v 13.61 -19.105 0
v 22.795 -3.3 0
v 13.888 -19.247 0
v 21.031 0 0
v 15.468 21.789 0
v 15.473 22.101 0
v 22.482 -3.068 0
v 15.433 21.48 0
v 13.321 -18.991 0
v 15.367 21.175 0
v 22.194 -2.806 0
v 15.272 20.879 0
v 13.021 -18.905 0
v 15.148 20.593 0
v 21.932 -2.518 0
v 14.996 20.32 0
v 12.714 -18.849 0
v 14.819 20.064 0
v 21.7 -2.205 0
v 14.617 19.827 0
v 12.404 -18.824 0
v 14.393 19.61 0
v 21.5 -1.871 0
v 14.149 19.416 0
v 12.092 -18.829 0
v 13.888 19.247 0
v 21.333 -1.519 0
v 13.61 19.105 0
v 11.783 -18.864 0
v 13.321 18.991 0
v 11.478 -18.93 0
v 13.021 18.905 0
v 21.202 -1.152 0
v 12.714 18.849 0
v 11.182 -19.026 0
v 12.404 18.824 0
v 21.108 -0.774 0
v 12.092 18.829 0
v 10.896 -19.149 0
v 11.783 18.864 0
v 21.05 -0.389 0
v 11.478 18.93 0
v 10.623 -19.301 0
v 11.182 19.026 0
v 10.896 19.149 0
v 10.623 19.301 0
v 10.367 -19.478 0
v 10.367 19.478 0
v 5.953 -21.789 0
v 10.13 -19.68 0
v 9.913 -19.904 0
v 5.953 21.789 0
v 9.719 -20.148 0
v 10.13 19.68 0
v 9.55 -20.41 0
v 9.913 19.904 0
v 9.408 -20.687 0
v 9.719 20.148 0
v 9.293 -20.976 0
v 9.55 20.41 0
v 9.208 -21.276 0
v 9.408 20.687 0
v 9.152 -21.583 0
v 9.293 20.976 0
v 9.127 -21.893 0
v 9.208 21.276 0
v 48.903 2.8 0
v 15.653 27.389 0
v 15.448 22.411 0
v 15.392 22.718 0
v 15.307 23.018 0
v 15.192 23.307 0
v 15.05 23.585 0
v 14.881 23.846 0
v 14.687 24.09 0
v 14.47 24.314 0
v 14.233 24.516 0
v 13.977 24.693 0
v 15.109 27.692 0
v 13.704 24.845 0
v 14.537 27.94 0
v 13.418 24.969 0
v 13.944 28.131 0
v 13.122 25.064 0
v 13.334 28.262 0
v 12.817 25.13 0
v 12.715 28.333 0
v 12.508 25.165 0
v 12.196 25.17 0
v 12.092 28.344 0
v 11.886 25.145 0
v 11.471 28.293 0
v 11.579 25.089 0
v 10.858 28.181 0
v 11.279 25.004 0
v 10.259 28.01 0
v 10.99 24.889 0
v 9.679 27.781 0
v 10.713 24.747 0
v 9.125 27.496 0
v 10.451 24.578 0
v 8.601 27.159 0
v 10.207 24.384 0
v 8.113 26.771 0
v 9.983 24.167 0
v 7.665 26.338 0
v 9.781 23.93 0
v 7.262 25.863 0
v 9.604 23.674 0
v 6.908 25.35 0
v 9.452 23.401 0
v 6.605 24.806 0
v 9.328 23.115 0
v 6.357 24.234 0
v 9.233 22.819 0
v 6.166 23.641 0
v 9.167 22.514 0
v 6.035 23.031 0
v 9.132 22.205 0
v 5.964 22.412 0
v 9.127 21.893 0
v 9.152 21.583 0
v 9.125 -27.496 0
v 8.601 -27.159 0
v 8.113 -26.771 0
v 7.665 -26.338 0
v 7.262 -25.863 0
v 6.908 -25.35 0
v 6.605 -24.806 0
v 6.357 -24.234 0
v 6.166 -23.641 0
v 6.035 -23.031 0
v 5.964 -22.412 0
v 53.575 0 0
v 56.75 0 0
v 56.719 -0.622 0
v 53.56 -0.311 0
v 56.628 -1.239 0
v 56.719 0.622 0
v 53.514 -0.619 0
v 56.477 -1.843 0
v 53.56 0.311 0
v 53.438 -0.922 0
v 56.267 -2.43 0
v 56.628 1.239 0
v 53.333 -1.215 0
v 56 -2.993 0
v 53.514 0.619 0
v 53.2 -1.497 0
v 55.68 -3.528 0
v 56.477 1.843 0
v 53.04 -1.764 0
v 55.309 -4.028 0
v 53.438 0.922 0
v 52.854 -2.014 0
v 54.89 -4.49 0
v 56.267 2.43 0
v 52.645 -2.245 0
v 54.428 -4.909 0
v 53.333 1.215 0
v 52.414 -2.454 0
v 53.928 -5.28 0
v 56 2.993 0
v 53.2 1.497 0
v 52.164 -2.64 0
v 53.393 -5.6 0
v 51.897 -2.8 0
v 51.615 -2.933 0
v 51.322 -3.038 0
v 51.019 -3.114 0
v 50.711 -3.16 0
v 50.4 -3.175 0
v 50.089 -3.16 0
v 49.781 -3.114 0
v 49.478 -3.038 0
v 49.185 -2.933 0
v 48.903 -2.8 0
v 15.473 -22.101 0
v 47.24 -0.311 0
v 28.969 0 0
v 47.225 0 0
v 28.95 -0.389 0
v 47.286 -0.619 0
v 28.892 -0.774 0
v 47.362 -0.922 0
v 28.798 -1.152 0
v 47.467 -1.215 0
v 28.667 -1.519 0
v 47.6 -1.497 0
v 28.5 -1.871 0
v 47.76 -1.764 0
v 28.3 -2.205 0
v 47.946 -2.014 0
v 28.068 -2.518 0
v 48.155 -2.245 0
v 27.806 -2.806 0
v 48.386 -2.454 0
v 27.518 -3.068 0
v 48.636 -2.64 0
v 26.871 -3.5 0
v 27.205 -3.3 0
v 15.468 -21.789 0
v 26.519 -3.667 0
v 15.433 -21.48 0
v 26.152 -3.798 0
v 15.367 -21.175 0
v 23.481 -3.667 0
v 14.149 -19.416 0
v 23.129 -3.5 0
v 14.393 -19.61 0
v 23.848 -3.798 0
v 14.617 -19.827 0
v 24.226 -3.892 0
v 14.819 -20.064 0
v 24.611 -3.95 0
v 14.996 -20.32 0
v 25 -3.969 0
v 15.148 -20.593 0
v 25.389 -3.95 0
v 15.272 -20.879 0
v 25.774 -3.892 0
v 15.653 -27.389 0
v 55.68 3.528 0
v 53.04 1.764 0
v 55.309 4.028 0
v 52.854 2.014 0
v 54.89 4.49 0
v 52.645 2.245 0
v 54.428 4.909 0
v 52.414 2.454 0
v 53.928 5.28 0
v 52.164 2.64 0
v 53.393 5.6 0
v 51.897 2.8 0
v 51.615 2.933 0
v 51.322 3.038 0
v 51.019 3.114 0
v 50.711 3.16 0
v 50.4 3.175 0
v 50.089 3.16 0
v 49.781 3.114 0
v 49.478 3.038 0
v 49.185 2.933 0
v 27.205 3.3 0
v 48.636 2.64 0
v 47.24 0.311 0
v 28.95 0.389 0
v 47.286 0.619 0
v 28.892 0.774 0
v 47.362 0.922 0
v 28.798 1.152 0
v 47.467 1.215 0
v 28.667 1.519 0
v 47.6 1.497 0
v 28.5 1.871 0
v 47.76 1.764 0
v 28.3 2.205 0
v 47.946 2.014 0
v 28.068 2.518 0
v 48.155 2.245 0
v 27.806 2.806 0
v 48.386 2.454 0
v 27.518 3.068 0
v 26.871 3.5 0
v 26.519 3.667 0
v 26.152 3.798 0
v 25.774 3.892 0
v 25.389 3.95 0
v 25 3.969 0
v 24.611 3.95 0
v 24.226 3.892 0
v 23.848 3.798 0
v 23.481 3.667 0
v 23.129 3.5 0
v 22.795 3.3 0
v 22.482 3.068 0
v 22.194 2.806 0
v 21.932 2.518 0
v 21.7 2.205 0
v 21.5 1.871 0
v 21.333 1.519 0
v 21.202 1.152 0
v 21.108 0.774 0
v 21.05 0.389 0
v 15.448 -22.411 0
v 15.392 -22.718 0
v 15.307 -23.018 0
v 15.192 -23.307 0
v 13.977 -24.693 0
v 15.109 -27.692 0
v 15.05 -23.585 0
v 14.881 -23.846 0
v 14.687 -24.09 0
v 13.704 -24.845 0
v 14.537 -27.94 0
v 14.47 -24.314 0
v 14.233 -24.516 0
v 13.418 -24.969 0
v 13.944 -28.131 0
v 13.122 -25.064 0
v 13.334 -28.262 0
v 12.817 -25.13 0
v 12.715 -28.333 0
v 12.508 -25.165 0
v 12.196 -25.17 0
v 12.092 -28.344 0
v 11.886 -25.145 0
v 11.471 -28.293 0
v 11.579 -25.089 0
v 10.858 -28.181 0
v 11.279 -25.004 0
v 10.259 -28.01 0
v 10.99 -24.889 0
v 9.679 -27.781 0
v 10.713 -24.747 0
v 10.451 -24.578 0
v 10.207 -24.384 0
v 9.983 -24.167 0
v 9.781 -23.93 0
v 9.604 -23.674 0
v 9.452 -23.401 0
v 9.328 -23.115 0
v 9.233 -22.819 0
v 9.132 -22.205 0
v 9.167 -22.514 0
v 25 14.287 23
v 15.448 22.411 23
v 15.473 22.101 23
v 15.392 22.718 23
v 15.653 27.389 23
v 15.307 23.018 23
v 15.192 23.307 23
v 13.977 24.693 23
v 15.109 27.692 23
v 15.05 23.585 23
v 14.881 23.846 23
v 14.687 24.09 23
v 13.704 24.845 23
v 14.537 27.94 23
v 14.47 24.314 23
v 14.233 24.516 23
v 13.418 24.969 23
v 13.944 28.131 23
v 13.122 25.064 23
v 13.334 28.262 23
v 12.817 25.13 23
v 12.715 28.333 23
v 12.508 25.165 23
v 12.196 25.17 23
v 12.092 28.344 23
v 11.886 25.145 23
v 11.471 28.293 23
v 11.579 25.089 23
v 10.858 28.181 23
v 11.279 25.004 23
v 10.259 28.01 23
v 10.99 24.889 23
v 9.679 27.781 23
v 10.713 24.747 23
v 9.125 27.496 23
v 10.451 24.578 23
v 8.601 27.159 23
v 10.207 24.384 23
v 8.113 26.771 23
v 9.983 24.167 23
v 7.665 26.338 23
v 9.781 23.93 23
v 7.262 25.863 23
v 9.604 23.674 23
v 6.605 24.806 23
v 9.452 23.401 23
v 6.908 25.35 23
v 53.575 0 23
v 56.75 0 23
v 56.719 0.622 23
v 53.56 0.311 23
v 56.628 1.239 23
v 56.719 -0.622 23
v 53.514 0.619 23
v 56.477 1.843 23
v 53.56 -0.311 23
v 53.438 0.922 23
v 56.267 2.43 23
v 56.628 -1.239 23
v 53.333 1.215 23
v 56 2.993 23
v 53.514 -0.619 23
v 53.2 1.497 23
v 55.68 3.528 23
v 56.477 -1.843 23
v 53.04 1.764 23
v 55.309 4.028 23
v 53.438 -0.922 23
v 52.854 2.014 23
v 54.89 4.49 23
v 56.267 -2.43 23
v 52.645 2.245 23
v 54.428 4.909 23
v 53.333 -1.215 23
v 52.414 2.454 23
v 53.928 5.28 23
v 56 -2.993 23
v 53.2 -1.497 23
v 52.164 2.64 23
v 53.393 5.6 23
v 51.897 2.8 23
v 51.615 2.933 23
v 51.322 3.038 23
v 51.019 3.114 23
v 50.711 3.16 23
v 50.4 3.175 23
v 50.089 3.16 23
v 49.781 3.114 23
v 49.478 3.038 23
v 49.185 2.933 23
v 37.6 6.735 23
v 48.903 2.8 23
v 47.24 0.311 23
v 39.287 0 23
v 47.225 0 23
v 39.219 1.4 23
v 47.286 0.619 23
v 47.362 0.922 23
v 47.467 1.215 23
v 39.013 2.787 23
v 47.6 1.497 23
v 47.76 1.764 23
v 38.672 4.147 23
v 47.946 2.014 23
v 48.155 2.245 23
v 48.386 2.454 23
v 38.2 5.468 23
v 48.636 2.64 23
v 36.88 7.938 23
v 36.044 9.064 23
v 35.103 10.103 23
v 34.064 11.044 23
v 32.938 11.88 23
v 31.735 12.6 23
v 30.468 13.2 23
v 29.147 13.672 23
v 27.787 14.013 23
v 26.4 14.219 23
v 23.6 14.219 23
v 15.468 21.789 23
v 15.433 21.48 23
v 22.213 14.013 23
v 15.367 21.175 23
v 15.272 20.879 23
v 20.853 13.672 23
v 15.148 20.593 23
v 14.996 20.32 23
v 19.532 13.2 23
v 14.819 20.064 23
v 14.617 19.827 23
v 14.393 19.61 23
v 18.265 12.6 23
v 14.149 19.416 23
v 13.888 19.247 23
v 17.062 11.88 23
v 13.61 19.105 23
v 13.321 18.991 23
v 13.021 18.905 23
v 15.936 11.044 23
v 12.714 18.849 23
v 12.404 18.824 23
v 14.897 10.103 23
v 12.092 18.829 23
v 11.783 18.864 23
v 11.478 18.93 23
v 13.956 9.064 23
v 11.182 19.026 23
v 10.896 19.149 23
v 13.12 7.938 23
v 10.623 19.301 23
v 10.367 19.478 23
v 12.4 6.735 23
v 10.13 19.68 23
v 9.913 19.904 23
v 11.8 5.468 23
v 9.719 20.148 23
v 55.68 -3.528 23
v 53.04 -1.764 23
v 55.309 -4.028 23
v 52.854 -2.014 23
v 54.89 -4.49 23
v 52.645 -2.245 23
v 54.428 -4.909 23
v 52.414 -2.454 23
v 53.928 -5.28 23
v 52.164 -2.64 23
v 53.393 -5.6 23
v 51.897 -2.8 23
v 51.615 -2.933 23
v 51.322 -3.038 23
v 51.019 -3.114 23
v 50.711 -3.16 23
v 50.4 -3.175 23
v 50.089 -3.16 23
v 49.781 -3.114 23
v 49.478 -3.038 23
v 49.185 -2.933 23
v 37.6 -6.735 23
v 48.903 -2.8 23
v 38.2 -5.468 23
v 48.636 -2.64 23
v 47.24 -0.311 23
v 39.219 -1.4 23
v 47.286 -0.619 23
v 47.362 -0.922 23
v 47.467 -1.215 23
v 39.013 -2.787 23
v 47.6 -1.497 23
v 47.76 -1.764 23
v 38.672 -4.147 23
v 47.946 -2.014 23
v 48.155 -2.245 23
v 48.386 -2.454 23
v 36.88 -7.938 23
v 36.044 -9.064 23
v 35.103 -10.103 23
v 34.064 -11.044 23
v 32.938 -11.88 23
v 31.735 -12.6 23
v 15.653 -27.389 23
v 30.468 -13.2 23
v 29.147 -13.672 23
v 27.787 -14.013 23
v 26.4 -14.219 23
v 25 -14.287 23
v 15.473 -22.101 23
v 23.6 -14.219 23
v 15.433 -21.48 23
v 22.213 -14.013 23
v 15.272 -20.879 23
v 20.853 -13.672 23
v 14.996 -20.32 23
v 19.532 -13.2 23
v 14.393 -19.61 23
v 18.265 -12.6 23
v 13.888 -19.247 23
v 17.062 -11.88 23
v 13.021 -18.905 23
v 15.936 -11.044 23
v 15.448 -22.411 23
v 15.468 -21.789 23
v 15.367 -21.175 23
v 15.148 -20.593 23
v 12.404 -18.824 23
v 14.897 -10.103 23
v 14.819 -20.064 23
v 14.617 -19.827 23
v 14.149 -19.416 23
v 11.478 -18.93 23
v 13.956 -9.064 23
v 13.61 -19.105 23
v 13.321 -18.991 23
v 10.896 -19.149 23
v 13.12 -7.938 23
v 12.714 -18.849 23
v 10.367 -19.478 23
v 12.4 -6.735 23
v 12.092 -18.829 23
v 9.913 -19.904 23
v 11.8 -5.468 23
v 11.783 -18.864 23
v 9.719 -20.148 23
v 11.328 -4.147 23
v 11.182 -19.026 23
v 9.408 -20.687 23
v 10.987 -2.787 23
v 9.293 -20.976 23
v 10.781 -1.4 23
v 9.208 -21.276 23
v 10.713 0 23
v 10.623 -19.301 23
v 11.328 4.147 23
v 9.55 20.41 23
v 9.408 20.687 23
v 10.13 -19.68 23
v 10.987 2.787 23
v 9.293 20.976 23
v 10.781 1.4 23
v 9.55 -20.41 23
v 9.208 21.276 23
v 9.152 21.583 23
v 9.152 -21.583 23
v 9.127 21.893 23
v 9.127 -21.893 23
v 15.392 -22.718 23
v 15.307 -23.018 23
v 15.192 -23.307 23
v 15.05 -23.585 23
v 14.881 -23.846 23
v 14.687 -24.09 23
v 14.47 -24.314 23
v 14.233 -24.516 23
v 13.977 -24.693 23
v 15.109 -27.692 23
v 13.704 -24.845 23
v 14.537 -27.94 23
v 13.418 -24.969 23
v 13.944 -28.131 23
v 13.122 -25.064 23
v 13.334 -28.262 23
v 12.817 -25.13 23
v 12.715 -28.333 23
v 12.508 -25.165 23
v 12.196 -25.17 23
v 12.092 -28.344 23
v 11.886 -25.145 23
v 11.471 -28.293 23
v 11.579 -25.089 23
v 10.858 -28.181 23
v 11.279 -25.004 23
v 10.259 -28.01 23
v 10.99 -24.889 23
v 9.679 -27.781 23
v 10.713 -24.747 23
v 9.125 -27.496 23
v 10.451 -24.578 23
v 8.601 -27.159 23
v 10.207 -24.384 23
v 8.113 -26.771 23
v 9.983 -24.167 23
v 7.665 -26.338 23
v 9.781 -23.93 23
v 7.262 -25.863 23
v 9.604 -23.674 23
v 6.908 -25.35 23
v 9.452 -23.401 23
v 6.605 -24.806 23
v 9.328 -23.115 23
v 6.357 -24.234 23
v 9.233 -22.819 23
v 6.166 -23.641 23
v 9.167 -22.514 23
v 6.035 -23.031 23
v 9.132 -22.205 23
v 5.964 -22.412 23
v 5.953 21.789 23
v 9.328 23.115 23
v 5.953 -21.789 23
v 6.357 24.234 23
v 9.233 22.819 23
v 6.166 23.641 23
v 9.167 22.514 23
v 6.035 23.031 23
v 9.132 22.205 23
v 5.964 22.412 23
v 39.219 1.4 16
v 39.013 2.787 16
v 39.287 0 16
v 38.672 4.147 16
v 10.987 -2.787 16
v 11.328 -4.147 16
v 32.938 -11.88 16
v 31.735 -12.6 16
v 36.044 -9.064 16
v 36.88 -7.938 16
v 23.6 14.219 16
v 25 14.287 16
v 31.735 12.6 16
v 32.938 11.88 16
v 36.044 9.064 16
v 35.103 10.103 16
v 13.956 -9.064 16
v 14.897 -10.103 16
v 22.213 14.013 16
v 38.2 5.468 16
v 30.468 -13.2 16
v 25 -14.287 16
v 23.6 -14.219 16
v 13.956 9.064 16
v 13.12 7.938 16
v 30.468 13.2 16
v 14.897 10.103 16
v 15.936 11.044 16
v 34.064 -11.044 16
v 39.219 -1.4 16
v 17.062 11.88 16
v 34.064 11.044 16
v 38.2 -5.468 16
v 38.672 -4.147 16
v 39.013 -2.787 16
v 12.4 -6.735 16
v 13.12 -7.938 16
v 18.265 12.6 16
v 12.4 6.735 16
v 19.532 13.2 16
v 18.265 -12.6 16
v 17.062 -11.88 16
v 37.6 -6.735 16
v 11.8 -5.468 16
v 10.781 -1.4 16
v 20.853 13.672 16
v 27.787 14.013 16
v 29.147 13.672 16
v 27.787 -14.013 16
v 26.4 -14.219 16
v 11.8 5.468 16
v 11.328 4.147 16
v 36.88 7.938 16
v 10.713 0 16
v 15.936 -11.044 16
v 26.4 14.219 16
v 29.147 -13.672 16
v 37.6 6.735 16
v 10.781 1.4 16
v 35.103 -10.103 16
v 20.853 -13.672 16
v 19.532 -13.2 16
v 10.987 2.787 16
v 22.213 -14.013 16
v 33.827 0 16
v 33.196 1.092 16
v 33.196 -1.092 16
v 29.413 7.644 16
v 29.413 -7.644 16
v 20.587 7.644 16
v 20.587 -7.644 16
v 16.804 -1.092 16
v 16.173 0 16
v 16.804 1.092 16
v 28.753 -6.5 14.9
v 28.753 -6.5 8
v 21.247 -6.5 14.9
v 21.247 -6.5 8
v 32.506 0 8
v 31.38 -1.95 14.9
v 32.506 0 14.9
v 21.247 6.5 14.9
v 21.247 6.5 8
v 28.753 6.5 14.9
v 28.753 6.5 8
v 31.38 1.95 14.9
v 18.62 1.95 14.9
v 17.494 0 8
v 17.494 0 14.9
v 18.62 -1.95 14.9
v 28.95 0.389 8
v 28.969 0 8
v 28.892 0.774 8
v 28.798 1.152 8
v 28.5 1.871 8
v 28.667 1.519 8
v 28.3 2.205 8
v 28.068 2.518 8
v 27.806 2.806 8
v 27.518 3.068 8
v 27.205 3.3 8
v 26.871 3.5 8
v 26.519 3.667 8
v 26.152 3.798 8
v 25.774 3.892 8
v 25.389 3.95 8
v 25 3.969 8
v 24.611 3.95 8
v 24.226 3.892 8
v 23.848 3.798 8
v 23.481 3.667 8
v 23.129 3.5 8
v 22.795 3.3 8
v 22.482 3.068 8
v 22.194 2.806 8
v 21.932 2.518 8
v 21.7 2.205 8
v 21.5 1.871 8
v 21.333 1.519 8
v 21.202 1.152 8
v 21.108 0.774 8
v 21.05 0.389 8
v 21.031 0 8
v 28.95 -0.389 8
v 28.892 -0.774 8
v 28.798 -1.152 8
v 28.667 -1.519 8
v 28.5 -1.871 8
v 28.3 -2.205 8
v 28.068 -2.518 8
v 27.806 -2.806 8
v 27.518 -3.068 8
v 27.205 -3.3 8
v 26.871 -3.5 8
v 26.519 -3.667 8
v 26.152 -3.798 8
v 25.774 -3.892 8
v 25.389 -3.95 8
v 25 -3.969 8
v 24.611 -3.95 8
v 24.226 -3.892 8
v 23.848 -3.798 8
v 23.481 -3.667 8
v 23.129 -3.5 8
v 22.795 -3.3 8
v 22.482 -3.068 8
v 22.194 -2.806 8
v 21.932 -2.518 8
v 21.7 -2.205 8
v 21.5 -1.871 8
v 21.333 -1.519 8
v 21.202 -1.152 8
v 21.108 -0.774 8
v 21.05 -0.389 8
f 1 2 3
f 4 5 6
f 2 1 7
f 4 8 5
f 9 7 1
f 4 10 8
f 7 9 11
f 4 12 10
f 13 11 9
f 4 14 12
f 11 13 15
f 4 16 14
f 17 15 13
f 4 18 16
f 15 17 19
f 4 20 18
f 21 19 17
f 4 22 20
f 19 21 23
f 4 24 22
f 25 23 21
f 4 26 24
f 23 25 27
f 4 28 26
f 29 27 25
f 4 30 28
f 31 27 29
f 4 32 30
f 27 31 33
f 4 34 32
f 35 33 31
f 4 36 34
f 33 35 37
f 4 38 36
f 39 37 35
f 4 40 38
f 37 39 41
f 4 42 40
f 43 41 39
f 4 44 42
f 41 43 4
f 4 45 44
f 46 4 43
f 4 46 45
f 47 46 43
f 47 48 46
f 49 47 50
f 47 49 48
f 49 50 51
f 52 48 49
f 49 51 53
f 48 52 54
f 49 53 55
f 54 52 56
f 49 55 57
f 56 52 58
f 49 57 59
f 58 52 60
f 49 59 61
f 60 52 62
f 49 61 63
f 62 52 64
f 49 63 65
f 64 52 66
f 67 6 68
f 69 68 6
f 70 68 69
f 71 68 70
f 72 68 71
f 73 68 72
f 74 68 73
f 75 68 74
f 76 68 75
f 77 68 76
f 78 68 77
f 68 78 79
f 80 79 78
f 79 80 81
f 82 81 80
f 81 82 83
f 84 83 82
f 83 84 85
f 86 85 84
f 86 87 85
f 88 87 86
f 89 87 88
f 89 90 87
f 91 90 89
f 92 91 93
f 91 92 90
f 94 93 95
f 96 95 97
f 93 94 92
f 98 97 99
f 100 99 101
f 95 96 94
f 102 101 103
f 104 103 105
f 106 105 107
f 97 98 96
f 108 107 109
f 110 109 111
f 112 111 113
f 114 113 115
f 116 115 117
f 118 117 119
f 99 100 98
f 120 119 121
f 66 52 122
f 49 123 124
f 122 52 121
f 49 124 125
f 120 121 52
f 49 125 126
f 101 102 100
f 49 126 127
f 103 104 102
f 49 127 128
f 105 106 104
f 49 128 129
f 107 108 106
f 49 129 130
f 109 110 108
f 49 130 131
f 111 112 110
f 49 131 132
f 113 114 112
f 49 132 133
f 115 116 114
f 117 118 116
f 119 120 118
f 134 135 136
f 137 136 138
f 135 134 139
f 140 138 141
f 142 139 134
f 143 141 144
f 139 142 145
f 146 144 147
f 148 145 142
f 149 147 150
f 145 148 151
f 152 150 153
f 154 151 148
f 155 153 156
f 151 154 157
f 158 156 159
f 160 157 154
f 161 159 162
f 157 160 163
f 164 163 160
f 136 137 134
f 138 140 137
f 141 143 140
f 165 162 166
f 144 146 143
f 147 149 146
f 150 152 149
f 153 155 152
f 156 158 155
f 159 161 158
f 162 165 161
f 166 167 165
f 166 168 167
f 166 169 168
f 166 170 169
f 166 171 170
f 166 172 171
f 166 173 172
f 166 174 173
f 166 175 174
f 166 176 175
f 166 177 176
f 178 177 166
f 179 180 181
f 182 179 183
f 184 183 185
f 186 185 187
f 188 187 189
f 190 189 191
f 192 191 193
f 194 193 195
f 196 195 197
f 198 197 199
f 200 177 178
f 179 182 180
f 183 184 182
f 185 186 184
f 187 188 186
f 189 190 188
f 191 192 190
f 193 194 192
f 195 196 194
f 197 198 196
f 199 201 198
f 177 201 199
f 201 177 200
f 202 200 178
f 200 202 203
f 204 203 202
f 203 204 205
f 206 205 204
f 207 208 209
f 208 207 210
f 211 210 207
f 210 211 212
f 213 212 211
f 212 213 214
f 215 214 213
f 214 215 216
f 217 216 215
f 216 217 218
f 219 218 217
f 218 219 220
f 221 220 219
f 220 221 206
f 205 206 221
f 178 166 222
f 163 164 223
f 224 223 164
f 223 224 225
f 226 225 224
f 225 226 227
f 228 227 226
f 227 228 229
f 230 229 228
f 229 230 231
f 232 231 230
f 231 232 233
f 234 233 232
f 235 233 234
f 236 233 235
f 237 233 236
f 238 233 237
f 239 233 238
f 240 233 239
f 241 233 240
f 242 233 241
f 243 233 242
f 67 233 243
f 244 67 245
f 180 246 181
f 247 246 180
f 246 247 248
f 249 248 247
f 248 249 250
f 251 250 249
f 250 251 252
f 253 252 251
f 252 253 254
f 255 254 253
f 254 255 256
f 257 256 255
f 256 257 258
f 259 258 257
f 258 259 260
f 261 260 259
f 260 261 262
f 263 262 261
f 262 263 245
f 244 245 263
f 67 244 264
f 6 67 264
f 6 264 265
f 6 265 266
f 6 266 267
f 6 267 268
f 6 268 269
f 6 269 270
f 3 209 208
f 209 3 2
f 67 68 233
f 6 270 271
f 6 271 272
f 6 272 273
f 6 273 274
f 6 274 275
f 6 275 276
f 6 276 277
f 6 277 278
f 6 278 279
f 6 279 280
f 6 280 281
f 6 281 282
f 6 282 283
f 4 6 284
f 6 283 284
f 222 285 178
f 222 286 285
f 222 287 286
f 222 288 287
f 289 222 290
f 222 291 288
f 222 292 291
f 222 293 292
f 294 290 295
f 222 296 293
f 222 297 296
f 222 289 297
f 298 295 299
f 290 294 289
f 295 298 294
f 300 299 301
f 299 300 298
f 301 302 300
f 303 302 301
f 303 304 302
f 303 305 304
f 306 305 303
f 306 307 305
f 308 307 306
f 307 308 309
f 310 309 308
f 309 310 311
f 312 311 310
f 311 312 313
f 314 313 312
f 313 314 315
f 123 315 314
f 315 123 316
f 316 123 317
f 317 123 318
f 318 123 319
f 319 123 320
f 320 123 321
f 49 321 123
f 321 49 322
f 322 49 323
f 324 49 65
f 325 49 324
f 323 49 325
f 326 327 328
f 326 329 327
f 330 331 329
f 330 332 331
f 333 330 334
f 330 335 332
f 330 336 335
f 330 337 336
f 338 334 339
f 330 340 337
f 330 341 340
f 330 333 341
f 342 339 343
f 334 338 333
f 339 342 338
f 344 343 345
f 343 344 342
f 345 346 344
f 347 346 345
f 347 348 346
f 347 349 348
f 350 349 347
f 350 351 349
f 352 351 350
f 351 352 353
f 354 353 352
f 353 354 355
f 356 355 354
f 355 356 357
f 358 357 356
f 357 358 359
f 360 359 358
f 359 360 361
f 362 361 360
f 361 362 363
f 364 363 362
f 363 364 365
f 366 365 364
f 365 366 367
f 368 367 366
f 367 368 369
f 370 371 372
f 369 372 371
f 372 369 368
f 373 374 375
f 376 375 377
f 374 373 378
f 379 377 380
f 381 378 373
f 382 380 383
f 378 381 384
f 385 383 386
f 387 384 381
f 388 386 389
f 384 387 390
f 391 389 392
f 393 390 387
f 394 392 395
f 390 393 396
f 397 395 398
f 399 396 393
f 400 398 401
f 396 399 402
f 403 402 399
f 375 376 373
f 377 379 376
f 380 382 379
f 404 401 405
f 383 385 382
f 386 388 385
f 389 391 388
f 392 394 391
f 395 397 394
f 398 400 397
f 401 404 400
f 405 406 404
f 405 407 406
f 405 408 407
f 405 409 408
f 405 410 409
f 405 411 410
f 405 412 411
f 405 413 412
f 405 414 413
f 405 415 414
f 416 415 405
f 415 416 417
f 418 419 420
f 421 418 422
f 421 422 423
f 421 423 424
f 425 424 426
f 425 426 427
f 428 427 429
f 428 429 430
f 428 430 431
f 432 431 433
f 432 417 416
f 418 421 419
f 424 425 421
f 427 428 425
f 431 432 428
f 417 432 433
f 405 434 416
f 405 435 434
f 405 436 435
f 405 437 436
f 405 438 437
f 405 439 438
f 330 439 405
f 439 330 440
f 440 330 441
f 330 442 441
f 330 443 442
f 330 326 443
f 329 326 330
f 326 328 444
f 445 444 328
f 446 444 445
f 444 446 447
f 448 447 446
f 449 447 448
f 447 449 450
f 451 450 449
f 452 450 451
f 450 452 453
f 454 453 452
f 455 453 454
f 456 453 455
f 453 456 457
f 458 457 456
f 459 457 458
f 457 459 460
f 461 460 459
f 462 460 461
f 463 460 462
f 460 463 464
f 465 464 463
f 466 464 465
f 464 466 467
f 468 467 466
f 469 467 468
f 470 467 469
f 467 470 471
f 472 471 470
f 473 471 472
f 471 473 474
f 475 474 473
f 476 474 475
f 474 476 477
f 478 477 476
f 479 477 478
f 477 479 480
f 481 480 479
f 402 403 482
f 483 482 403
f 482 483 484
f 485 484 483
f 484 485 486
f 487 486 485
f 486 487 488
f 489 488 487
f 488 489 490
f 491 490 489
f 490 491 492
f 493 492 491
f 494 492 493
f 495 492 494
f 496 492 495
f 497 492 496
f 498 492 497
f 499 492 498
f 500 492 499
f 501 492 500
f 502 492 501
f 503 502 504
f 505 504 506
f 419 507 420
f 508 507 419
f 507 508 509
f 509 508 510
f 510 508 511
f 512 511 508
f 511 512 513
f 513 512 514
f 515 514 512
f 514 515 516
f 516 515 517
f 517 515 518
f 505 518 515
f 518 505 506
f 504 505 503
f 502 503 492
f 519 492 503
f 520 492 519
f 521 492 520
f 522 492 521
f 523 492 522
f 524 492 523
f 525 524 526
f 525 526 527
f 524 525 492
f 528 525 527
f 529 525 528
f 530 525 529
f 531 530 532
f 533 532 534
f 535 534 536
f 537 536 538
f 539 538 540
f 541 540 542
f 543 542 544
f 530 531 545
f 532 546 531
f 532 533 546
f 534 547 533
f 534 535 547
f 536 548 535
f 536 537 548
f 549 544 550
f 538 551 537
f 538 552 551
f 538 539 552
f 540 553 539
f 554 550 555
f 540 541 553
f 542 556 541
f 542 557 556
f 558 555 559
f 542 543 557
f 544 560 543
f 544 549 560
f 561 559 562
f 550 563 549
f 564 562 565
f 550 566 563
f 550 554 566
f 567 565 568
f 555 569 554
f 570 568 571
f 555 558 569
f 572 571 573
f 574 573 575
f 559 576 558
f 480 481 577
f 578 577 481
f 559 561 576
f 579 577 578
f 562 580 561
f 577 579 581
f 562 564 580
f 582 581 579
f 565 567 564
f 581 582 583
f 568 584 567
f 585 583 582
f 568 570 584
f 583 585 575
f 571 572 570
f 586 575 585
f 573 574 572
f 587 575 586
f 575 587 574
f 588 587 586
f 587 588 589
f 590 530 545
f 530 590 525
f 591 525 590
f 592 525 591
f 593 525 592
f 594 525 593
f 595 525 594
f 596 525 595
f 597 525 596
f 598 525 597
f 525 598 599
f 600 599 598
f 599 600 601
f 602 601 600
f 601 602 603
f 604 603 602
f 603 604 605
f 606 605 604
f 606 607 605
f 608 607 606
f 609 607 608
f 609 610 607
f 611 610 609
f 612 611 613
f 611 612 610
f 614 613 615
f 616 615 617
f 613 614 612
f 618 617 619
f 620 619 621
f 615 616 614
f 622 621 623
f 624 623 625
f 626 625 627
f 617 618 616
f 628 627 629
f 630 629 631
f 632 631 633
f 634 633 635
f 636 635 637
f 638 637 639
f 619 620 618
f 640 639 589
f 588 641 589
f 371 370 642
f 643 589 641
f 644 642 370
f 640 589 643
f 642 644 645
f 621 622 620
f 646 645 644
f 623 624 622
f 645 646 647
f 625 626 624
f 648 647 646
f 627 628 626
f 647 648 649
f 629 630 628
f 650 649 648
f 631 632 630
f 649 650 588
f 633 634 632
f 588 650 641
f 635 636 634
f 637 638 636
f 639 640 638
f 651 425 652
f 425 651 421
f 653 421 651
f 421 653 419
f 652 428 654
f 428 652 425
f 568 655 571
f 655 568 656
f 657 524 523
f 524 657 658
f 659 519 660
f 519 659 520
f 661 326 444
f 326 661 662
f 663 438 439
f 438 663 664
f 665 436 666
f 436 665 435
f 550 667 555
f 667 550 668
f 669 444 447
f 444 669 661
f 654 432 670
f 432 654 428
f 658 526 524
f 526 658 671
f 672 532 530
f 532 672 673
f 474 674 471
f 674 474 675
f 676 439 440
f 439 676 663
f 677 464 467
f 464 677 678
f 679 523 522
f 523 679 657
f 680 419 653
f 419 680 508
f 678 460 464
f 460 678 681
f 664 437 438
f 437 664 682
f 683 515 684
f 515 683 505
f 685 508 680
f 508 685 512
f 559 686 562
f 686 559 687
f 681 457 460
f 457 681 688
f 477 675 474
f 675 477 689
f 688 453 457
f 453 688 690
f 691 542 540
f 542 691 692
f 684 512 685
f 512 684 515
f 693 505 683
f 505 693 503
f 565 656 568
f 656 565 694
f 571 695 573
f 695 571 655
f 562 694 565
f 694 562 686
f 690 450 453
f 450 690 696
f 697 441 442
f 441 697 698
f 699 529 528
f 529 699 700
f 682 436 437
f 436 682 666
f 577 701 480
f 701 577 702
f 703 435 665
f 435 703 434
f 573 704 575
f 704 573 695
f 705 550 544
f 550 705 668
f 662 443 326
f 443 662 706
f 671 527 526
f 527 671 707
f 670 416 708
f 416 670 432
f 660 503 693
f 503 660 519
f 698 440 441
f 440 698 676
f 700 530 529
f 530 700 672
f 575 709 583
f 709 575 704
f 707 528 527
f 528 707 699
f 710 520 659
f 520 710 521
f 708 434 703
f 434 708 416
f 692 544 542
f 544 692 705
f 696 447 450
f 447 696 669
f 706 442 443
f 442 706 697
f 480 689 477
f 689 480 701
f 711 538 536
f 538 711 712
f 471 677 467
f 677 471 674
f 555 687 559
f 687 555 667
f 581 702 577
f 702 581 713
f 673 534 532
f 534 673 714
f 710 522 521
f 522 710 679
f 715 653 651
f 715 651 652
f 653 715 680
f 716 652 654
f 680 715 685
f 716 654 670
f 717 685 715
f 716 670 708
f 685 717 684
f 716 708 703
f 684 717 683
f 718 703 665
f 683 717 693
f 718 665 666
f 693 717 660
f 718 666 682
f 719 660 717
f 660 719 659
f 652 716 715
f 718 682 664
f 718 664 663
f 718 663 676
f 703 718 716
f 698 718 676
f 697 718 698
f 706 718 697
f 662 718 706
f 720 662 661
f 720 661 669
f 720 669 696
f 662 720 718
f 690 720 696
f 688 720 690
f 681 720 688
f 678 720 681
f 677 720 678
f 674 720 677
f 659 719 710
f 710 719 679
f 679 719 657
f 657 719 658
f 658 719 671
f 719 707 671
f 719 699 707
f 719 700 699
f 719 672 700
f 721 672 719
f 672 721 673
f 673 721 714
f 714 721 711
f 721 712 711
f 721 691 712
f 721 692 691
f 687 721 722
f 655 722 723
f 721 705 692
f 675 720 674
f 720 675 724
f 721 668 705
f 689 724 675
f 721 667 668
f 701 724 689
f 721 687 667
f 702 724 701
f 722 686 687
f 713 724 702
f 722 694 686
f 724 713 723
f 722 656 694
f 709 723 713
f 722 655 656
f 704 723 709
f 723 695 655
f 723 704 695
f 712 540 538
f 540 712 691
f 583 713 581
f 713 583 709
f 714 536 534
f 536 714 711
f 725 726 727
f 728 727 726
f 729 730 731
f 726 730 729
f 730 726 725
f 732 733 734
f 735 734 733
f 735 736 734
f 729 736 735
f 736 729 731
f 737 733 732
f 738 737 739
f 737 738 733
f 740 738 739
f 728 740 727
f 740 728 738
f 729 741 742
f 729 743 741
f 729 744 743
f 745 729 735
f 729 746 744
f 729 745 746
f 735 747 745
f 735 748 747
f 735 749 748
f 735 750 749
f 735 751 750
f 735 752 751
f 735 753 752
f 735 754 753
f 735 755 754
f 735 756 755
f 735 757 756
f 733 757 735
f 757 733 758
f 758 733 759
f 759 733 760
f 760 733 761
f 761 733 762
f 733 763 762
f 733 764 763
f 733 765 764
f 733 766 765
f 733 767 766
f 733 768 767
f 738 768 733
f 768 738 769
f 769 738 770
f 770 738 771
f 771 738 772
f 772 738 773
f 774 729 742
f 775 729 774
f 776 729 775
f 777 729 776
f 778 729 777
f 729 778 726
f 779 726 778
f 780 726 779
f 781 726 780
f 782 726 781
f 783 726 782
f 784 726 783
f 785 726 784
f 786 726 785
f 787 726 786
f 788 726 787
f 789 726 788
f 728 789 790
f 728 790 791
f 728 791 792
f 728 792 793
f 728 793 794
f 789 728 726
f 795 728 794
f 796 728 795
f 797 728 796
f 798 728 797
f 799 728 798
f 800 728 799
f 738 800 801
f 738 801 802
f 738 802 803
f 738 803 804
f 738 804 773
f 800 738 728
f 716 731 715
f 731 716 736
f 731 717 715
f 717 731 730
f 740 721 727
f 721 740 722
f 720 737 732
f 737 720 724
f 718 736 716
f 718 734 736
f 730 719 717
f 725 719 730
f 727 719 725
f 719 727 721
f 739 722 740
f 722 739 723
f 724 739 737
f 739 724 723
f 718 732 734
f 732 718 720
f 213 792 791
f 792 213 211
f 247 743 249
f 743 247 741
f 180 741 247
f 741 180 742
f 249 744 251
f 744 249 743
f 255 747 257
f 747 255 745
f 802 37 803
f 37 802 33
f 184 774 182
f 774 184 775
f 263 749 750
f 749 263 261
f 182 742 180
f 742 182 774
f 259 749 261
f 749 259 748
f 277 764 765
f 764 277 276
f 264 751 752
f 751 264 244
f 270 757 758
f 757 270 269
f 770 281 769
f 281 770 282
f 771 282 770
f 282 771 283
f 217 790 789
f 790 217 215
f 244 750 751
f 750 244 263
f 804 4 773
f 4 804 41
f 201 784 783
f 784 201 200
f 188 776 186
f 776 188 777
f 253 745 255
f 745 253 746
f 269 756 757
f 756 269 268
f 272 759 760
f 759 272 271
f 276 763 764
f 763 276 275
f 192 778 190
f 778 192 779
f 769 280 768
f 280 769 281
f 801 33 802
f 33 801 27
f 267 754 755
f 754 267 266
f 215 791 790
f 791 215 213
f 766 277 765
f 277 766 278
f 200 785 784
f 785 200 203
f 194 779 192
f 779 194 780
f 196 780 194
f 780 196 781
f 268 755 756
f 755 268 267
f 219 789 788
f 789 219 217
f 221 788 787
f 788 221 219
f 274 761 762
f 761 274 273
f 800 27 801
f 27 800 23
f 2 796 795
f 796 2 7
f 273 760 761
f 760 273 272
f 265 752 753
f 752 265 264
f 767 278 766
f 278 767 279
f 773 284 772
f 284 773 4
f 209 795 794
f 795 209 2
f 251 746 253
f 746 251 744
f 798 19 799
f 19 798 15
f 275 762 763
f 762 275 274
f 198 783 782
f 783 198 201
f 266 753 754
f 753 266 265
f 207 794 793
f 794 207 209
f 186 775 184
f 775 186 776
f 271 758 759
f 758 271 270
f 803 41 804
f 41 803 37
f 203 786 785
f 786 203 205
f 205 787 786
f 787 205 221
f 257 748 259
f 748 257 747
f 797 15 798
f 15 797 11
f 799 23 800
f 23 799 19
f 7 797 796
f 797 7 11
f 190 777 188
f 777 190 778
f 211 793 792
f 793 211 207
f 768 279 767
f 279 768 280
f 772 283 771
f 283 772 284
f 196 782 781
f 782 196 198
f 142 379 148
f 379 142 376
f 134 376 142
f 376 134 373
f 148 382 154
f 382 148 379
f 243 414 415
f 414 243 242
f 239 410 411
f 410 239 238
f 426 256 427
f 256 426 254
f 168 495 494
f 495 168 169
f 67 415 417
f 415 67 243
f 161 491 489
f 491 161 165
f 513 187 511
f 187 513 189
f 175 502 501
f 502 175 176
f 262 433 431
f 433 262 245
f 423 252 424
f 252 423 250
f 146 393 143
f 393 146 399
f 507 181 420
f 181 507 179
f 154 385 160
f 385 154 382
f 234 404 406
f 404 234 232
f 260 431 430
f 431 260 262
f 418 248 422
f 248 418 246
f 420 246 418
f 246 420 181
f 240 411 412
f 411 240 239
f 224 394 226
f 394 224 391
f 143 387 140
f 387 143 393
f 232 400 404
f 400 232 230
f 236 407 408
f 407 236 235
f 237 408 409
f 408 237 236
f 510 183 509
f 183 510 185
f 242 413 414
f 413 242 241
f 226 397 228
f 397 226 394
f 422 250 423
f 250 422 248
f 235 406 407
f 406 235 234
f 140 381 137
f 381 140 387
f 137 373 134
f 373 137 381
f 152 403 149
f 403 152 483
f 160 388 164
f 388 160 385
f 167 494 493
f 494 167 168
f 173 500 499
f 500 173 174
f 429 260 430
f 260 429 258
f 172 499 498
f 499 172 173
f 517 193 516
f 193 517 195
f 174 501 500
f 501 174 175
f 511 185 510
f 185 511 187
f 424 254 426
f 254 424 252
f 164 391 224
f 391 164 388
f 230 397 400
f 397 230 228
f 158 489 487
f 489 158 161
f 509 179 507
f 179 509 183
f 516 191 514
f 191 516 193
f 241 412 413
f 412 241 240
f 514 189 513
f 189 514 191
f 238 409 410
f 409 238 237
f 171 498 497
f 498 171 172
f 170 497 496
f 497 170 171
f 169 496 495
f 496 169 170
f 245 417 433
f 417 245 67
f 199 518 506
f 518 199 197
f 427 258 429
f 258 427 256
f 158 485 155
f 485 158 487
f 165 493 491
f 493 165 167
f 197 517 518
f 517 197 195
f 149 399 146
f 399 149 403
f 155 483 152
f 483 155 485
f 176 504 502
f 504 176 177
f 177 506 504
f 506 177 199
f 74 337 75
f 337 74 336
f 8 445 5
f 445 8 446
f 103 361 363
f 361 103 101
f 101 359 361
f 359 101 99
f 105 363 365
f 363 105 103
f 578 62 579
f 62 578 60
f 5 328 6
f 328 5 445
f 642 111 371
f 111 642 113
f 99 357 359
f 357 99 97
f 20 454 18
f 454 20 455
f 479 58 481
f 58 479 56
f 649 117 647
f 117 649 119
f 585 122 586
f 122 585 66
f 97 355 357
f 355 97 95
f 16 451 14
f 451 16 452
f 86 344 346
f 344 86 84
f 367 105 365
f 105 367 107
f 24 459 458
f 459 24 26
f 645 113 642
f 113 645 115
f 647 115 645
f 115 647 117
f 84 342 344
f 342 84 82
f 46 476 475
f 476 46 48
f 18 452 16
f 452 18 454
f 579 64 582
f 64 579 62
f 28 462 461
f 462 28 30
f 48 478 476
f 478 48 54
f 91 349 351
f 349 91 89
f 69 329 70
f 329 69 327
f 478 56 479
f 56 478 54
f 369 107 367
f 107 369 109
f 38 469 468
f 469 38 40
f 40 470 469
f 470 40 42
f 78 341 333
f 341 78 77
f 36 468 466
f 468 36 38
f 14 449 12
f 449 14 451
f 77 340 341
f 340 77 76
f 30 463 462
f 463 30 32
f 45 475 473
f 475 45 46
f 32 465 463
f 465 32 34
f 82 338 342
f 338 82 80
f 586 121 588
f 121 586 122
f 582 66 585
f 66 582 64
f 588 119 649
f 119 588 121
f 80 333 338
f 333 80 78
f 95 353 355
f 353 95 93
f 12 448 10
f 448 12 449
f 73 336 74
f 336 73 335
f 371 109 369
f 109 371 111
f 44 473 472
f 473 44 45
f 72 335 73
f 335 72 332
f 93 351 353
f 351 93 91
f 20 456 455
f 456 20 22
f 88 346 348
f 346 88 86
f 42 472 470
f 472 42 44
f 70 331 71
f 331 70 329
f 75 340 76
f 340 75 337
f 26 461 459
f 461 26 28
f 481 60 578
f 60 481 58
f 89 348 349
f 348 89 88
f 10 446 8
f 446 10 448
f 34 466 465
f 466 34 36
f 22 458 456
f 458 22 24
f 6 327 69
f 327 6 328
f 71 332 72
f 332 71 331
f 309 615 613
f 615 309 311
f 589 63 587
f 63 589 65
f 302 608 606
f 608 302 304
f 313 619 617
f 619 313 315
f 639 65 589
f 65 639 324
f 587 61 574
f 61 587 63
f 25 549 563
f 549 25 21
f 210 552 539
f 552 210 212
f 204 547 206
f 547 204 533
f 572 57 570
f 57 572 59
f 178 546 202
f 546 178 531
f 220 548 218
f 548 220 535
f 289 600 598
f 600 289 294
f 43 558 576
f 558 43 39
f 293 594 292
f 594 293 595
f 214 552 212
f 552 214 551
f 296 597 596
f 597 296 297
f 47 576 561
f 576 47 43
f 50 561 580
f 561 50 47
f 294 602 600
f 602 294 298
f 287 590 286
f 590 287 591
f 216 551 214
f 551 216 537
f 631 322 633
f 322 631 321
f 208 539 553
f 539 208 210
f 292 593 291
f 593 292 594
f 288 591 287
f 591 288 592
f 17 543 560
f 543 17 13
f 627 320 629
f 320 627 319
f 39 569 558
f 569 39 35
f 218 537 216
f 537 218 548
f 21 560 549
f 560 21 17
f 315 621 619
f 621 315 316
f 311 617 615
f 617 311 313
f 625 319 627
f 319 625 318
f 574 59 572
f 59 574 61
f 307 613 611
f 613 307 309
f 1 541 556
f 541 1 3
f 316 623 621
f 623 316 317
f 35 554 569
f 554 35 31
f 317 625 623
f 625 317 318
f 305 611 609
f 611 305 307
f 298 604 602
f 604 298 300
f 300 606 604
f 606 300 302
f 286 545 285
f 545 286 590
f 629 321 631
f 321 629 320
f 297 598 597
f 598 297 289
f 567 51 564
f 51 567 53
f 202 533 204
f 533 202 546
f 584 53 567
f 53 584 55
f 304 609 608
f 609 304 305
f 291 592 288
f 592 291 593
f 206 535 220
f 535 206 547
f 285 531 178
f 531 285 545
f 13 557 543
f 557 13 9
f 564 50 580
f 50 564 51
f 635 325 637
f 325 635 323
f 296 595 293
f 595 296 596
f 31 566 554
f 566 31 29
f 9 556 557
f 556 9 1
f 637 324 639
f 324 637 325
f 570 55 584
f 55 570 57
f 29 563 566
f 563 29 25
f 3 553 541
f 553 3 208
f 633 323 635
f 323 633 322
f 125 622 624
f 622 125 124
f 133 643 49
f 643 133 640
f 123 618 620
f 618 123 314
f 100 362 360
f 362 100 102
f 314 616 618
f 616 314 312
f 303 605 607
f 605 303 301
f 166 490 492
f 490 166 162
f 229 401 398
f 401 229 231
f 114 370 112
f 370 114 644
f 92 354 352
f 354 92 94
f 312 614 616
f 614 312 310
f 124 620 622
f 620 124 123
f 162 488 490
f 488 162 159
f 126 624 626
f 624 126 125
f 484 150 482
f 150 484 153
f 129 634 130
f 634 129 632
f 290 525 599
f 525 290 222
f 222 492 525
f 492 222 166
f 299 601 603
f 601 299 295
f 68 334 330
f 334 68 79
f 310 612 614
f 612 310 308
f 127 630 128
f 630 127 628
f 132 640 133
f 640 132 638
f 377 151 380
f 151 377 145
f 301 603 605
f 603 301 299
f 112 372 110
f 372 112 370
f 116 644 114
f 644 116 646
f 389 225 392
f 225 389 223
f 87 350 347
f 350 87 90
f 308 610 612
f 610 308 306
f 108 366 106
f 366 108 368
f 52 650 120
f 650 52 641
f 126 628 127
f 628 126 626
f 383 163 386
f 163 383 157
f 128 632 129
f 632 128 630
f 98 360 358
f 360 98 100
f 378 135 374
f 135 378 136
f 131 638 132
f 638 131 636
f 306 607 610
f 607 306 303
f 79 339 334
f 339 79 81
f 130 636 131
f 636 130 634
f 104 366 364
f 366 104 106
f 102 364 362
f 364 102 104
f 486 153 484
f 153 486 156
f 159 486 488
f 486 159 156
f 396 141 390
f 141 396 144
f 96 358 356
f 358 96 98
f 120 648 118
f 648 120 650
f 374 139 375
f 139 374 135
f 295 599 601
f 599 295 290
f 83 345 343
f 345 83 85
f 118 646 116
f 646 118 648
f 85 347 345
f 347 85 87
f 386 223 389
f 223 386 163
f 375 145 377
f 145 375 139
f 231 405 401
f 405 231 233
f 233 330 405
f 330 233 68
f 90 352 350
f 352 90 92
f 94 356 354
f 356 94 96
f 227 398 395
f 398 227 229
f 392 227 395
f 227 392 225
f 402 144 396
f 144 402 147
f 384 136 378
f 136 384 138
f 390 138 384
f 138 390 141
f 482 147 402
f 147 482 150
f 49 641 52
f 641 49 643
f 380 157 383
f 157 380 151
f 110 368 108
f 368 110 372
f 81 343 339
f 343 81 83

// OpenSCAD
/*
 * parameterizeedd bolt or nut handle
 *
 * head_height
 * bolt_diameter
 *  ______
 *  |    |  -> this vertical is head heigth
 *    ||
 *    ||    -> this is bolt_diameter
 *    ||
 *
 * wrench_size is the size of the wrench that would fit 
 *     the hex head
 * 
 * offset_into_body is the vertical distance from the bottom
 *     of the piece to where the bottom of the head rests
 *
 * 
 * hopefully doesn't need adjustment
 * hex_ratio - the ratio of the flat diameter to the pointy
 *                 diameter of a hex head
 * d1_size   - diameters
 * d2_size   - define the hexogonal cone that breaks the
 *                 edges of the hex socket
 *
 */

$inch = 25.4;

/* 
 * Start Parameters
 */

$head_height = 8; // mm
$bolt_diameter = 5/16 * $inch; 
$wrench_size = 1/2 * $inch + 0.3; //0.3mm for clearance
$offset_into_body=8;

/* 
 * End Parameters
 */
 
/* 
 * start constants (which might get adjusted)
 */

$edge_break_fudge = 0.55;
$hex_ratio = 0.866;
$d1_size = $wrench_size/$hex_ratio*0.6;
$d2_size = $wrench_size/$hex_ratio*1.4;

/* 
 * end constants
 */

module bolt_chassis(height) {
    difference() {
        hull() {
            for (nub = [0:2]) {
                rotate(nub*120, [0,0,1]) {
                    translate([2*$inch / 2, 0,0]) {
                        cylinder(d=0.5*$inch, h=height, $fn=64);
                    }
                }
            }            
        }
        cylinder(d=1.35*$inch, h=height, $fn=64);
        for (bolthole = [0:2]) {
            rotate(bolthole*120, [0,0,1]) {
                translate([2*$inch / 2, 0,-1]) {
                    cylinder(d=1/4*$inch, h=height+2, $fn=64);
                }
            }
        }
    }
}

module top_body() {
    difference() {
        translate([0,0,0]) {
            cylinder(d=1.35*$inch, h=23, $fn=64);
        }
        translate([0,0,8+$head_height]) {
            cylinder(d=1.125*$inch, h=10, $fn=64);
        }
        // hex head
        translate([0,0,8]) {
            cylinder(d=$wrench_size/$hex_ratio, h=$head_height+2, $fn=6);
        }
        // ease the edges of the hex hole
        translate([0,0, 8 + $head_height*$edge_break_fudge]) {
            cylinder(d1=$d1_size, d2=$d2_size, h=5, $fn=6);
        }
        // bolt thru hole
        translate([0,0,-1]) {
            cylinder(d=$bolt_diameter, h=31, $fn=64);
        }
    }
}

translate([25,0,0]) {
    union() {
        top_body();
        bolt_chassis(23);
    }
}
